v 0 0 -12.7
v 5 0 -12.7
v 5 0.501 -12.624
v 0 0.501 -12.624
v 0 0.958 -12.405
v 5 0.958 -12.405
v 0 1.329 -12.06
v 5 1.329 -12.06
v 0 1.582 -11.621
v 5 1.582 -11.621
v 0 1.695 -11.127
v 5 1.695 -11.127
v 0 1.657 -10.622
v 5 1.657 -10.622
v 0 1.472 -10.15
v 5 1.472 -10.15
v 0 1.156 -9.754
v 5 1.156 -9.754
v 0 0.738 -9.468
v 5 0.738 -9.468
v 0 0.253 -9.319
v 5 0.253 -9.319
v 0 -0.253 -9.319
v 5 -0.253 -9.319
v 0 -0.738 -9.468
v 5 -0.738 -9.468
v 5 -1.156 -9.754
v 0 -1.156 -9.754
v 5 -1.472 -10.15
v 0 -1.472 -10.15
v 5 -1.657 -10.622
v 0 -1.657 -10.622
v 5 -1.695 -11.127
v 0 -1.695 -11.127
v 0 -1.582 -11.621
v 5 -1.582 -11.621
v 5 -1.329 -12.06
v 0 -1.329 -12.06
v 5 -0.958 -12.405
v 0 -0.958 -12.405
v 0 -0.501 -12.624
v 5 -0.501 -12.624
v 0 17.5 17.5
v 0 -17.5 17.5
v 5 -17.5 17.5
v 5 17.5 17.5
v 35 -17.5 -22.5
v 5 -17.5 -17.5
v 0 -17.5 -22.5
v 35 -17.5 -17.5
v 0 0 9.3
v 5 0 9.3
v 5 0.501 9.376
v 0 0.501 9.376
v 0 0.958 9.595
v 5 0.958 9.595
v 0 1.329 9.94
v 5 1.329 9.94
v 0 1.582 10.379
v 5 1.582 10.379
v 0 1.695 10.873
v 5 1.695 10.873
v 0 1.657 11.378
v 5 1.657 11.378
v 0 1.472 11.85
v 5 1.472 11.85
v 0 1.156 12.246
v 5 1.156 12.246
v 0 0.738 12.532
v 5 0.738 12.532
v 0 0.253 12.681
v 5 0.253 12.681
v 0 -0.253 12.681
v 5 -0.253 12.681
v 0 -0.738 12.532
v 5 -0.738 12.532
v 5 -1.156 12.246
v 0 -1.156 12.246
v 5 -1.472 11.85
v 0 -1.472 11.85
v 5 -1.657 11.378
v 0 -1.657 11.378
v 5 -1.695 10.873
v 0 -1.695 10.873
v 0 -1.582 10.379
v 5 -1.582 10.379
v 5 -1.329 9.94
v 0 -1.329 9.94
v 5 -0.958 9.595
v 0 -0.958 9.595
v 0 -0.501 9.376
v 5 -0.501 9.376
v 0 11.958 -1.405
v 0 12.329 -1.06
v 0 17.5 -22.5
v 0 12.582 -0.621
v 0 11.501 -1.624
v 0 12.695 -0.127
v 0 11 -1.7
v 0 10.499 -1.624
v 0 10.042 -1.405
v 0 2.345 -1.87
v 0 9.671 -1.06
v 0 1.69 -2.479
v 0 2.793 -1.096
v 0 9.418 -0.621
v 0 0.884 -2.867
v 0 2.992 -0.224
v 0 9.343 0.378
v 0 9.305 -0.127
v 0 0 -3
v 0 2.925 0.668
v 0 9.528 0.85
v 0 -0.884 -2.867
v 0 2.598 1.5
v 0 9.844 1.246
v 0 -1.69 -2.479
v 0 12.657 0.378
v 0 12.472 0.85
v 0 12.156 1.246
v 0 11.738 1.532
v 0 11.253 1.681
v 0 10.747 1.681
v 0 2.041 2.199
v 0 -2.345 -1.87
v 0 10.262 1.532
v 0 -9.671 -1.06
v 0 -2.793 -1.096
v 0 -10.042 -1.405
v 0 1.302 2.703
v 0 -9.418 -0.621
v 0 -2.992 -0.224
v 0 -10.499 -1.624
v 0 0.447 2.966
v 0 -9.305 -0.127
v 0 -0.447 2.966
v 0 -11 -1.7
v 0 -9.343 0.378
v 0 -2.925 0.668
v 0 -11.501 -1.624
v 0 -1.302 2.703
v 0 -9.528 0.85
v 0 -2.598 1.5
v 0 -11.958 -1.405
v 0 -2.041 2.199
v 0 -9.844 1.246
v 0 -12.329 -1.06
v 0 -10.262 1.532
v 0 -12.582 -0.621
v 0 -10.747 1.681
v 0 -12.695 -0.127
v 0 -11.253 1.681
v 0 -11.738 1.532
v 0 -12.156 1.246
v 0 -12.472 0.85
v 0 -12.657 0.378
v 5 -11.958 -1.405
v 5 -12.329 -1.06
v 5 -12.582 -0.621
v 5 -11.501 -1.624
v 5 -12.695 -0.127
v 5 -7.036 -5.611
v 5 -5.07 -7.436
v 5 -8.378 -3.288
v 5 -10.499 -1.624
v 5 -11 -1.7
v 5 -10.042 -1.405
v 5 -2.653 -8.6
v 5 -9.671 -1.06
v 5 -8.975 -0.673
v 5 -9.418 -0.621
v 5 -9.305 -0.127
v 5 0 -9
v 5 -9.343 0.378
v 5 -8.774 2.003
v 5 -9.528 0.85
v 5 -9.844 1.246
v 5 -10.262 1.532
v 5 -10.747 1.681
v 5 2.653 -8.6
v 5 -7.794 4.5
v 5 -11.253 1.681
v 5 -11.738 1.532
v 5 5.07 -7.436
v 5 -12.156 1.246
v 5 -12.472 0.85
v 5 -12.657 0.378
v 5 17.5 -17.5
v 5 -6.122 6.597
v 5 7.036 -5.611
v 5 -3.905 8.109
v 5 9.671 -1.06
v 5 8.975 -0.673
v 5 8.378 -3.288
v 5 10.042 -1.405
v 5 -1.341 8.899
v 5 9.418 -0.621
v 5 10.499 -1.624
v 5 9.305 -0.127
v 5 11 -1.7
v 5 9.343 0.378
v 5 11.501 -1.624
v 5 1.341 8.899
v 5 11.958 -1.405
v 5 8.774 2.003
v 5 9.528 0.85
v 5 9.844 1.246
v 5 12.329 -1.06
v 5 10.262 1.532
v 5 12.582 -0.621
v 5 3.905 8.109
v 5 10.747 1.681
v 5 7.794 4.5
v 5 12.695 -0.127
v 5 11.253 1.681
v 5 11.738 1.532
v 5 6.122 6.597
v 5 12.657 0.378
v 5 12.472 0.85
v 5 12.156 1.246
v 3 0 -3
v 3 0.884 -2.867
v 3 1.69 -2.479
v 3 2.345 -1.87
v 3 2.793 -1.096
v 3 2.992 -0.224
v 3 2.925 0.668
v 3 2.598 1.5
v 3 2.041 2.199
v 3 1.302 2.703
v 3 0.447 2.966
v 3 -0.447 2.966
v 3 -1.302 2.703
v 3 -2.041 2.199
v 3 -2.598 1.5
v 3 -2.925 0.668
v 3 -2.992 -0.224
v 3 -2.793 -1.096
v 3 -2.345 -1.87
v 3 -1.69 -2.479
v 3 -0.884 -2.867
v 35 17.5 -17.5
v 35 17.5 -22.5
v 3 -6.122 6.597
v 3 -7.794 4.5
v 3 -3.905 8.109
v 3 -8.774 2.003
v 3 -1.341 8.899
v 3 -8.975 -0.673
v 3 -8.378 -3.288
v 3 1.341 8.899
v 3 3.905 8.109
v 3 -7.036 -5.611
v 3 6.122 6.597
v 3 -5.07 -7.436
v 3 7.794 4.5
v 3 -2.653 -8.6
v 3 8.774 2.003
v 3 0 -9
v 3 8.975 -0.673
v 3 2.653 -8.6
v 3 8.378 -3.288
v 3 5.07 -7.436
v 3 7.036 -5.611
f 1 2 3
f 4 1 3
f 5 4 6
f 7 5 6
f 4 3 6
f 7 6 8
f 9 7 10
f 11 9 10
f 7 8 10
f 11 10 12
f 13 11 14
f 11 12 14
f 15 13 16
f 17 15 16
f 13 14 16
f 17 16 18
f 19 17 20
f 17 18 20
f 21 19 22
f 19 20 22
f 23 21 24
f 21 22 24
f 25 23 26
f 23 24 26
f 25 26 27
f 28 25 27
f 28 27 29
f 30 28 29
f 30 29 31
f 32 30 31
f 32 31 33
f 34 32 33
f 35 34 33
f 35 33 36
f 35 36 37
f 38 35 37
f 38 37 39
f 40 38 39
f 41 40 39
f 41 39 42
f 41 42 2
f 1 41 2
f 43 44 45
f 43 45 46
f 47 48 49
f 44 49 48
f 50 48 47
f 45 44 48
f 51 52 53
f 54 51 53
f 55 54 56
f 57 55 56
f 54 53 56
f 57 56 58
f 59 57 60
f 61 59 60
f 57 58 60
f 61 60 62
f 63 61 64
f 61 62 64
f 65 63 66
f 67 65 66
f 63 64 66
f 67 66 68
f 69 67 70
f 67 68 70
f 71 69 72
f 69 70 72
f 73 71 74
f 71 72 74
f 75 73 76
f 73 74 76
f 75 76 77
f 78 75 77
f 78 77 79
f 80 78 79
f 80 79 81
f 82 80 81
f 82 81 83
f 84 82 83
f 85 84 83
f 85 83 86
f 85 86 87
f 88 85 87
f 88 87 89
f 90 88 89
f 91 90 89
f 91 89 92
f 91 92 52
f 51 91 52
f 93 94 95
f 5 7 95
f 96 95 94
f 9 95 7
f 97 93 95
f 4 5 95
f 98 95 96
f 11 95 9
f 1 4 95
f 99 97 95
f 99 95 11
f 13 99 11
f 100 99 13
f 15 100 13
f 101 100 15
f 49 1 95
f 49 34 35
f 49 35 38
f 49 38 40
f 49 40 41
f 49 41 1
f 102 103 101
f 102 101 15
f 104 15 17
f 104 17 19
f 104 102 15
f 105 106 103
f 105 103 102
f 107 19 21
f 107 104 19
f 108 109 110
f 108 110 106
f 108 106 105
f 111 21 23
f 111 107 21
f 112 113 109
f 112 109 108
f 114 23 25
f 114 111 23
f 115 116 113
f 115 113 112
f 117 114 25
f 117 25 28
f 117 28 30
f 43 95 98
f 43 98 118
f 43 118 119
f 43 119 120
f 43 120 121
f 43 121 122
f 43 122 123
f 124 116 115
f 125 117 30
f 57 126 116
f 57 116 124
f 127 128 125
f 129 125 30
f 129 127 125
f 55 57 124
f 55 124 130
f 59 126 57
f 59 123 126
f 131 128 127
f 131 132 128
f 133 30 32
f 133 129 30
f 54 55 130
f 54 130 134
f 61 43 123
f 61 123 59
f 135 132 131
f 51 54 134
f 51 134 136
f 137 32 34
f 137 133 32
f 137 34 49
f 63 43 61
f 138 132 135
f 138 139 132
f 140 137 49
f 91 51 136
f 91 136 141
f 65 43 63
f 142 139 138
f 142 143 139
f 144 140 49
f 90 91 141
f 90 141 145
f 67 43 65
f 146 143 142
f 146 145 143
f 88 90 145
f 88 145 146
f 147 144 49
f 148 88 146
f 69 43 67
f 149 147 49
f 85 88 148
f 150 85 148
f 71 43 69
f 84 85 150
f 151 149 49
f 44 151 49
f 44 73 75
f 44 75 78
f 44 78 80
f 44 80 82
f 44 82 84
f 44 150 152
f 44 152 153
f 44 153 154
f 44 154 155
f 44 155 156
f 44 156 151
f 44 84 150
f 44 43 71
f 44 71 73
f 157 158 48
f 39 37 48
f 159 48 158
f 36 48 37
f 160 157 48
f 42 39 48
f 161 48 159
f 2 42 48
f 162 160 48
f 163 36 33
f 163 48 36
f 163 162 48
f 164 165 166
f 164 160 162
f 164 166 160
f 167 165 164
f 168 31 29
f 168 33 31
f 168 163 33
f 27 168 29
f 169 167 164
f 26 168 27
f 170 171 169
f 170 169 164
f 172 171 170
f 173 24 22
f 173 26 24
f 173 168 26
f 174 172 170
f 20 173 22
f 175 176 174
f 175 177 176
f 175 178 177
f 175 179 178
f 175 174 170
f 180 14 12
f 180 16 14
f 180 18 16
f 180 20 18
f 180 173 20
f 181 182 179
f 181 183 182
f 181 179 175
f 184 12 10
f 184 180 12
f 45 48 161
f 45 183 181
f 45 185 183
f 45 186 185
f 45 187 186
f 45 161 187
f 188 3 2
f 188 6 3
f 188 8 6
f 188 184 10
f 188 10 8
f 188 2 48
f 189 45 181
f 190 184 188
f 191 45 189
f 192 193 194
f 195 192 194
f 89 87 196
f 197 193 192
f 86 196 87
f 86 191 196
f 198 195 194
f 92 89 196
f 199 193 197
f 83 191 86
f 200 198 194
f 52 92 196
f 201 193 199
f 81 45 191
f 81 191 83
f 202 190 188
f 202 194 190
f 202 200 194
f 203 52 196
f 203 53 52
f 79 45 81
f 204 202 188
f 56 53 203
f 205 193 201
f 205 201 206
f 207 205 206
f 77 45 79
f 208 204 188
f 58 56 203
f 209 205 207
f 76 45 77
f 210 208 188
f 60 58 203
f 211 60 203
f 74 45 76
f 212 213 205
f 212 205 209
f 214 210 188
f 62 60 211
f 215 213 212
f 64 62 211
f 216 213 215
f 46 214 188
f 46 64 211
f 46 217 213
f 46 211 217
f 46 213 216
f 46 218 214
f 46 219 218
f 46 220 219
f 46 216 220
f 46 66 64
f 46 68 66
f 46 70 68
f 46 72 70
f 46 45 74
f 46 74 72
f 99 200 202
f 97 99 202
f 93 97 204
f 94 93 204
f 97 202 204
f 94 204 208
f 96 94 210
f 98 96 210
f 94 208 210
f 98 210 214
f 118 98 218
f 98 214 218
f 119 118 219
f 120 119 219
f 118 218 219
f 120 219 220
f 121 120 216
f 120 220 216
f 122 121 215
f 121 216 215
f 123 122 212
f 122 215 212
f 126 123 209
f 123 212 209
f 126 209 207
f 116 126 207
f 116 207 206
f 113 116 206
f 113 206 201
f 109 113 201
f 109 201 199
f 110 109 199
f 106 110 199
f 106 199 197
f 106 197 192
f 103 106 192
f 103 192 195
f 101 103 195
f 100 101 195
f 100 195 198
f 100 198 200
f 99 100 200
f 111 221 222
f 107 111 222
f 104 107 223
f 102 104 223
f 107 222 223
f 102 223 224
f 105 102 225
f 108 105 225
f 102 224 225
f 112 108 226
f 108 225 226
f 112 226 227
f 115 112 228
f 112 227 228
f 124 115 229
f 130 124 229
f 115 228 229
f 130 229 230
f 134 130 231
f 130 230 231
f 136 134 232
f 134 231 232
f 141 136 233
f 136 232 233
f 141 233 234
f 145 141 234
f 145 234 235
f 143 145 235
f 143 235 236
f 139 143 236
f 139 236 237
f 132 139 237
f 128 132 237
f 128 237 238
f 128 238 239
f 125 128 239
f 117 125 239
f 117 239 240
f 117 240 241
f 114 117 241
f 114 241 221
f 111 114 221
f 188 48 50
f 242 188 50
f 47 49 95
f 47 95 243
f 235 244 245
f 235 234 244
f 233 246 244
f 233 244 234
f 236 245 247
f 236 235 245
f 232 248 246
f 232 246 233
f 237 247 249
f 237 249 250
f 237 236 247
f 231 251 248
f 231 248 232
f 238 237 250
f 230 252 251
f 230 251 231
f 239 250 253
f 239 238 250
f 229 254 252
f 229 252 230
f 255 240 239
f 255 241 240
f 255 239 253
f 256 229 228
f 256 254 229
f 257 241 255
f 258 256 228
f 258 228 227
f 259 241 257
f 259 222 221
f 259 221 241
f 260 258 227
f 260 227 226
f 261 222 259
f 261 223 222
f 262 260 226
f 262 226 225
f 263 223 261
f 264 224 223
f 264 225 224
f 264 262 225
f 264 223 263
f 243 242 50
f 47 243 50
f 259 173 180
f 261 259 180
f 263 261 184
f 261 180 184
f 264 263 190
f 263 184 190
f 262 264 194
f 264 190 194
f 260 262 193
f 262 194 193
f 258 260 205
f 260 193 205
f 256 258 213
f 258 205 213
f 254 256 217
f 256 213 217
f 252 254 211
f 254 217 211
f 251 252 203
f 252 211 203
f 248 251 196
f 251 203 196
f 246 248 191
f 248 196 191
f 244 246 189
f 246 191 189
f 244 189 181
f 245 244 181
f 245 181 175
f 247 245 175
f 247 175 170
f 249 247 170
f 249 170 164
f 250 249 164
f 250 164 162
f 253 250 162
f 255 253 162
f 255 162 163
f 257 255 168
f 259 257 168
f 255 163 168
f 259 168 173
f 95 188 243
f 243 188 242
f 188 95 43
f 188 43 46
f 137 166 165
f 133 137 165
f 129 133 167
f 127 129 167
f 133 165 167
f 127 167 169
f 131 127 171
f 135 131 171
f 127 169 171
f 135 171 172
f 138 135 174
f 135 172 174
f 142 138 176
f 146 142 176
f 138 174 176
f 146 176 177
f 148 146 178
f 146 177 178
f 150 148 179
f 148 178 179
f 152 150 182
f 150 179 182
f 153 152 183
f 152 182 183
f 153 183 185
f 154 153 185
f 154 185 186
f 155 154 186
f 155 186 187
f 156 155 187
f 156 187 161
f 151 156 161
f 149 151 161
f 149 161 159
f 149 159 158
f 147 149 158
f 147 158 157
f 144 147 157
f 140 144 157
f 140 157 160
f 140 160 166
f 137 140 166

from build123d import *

# Parameters (mm, degrees)
SKETCH3_W           = 35
SKETCH3_H           = 35
BOSS_EXTRUDE1_DEPTH = 5
SKETCH4_R           = 9
CUT_EXTRUDE1_DEPTH  = 2
SKETCH5_R           = 3
CUT_EXTRUDE2_DEPTH  = 25.929901725
SKETCH6_R           = 1.7
CUT_EXTRUDE3_DEPTH  = 26.248762346
SKETCH8_W           = 35
SKETCH8_H           = 35
BOSS_EXTRUDE2_DEPTH = 5


with BuildPart() as part:
    # Sketch3 → Boss-Extrude1 (new body)
    with BuildSketch(Plane.YZ):
        Rectangle(SKETCH3_W, SKETCH3_H)
    extrude(amount=BOSS_EXTRUDE1_DEPTH)

    # Sketch4 → Cut-Extrude1 (cut)
    with BuildSketch(Plane.YZ.offset(5)):
        with Locations(Location((0, 0, 0), (0, 0, 270))):
            Circle(SKETCH4_R)
    extrude(amount=-CUT_EXTRUDE1_DEPTH, mode=Mode.SUBTRACT)

    # Sketch5 → Cut-Extrude2 (cut, through all)
    with BuildSketch(Plane.YZ.offset(3)):
        with Locations(Location((0, 0, 0), (0, 0, 270))):
            Circle(SKETCH5_R)
    extrude(amount=-CUT_EXTRUDE2_DEPTH, mode=Mode.SUBTRACT)

    # Sketch6 → Cut-Extrude3 (cut, through all)
    with BuildSketch(Plane.YZ.offset(5)):
        with Locations(Location((0, 11, 0), (0, 0, 270))):
            Circle(SKETCH6_R)
        with Locations(Location((-11, 0, 0), (0, 0, 270))):
            Circle(SKETCH6_R)
        with Locations(Location((0, -11, 0), (0, 0, 270))):
            Circle(SKETCH6_R)
        with Locations(Location((11, 0, 0), (0, 0, 270))):
            Circle(SKETCH6_R)
    extrude(amount=-CUT_EXTRUDE3_DEPTH, mode=Mode.SUBTRACT)

    # Sketch8 → Boss-Extrude2 (add)
    with BuildSketch(Plane(origin=(0, 0, -17.5), x_dir=(1, 0, 0), z_dir=(0, 0, -1))):
        with Locations((17.5, 0)):
            Rectangle(SKETCH8_W, SKETCH8_H)
    extrude(amount=BOSS_EXTRUDE2_DEPTH)


solid = part.part
